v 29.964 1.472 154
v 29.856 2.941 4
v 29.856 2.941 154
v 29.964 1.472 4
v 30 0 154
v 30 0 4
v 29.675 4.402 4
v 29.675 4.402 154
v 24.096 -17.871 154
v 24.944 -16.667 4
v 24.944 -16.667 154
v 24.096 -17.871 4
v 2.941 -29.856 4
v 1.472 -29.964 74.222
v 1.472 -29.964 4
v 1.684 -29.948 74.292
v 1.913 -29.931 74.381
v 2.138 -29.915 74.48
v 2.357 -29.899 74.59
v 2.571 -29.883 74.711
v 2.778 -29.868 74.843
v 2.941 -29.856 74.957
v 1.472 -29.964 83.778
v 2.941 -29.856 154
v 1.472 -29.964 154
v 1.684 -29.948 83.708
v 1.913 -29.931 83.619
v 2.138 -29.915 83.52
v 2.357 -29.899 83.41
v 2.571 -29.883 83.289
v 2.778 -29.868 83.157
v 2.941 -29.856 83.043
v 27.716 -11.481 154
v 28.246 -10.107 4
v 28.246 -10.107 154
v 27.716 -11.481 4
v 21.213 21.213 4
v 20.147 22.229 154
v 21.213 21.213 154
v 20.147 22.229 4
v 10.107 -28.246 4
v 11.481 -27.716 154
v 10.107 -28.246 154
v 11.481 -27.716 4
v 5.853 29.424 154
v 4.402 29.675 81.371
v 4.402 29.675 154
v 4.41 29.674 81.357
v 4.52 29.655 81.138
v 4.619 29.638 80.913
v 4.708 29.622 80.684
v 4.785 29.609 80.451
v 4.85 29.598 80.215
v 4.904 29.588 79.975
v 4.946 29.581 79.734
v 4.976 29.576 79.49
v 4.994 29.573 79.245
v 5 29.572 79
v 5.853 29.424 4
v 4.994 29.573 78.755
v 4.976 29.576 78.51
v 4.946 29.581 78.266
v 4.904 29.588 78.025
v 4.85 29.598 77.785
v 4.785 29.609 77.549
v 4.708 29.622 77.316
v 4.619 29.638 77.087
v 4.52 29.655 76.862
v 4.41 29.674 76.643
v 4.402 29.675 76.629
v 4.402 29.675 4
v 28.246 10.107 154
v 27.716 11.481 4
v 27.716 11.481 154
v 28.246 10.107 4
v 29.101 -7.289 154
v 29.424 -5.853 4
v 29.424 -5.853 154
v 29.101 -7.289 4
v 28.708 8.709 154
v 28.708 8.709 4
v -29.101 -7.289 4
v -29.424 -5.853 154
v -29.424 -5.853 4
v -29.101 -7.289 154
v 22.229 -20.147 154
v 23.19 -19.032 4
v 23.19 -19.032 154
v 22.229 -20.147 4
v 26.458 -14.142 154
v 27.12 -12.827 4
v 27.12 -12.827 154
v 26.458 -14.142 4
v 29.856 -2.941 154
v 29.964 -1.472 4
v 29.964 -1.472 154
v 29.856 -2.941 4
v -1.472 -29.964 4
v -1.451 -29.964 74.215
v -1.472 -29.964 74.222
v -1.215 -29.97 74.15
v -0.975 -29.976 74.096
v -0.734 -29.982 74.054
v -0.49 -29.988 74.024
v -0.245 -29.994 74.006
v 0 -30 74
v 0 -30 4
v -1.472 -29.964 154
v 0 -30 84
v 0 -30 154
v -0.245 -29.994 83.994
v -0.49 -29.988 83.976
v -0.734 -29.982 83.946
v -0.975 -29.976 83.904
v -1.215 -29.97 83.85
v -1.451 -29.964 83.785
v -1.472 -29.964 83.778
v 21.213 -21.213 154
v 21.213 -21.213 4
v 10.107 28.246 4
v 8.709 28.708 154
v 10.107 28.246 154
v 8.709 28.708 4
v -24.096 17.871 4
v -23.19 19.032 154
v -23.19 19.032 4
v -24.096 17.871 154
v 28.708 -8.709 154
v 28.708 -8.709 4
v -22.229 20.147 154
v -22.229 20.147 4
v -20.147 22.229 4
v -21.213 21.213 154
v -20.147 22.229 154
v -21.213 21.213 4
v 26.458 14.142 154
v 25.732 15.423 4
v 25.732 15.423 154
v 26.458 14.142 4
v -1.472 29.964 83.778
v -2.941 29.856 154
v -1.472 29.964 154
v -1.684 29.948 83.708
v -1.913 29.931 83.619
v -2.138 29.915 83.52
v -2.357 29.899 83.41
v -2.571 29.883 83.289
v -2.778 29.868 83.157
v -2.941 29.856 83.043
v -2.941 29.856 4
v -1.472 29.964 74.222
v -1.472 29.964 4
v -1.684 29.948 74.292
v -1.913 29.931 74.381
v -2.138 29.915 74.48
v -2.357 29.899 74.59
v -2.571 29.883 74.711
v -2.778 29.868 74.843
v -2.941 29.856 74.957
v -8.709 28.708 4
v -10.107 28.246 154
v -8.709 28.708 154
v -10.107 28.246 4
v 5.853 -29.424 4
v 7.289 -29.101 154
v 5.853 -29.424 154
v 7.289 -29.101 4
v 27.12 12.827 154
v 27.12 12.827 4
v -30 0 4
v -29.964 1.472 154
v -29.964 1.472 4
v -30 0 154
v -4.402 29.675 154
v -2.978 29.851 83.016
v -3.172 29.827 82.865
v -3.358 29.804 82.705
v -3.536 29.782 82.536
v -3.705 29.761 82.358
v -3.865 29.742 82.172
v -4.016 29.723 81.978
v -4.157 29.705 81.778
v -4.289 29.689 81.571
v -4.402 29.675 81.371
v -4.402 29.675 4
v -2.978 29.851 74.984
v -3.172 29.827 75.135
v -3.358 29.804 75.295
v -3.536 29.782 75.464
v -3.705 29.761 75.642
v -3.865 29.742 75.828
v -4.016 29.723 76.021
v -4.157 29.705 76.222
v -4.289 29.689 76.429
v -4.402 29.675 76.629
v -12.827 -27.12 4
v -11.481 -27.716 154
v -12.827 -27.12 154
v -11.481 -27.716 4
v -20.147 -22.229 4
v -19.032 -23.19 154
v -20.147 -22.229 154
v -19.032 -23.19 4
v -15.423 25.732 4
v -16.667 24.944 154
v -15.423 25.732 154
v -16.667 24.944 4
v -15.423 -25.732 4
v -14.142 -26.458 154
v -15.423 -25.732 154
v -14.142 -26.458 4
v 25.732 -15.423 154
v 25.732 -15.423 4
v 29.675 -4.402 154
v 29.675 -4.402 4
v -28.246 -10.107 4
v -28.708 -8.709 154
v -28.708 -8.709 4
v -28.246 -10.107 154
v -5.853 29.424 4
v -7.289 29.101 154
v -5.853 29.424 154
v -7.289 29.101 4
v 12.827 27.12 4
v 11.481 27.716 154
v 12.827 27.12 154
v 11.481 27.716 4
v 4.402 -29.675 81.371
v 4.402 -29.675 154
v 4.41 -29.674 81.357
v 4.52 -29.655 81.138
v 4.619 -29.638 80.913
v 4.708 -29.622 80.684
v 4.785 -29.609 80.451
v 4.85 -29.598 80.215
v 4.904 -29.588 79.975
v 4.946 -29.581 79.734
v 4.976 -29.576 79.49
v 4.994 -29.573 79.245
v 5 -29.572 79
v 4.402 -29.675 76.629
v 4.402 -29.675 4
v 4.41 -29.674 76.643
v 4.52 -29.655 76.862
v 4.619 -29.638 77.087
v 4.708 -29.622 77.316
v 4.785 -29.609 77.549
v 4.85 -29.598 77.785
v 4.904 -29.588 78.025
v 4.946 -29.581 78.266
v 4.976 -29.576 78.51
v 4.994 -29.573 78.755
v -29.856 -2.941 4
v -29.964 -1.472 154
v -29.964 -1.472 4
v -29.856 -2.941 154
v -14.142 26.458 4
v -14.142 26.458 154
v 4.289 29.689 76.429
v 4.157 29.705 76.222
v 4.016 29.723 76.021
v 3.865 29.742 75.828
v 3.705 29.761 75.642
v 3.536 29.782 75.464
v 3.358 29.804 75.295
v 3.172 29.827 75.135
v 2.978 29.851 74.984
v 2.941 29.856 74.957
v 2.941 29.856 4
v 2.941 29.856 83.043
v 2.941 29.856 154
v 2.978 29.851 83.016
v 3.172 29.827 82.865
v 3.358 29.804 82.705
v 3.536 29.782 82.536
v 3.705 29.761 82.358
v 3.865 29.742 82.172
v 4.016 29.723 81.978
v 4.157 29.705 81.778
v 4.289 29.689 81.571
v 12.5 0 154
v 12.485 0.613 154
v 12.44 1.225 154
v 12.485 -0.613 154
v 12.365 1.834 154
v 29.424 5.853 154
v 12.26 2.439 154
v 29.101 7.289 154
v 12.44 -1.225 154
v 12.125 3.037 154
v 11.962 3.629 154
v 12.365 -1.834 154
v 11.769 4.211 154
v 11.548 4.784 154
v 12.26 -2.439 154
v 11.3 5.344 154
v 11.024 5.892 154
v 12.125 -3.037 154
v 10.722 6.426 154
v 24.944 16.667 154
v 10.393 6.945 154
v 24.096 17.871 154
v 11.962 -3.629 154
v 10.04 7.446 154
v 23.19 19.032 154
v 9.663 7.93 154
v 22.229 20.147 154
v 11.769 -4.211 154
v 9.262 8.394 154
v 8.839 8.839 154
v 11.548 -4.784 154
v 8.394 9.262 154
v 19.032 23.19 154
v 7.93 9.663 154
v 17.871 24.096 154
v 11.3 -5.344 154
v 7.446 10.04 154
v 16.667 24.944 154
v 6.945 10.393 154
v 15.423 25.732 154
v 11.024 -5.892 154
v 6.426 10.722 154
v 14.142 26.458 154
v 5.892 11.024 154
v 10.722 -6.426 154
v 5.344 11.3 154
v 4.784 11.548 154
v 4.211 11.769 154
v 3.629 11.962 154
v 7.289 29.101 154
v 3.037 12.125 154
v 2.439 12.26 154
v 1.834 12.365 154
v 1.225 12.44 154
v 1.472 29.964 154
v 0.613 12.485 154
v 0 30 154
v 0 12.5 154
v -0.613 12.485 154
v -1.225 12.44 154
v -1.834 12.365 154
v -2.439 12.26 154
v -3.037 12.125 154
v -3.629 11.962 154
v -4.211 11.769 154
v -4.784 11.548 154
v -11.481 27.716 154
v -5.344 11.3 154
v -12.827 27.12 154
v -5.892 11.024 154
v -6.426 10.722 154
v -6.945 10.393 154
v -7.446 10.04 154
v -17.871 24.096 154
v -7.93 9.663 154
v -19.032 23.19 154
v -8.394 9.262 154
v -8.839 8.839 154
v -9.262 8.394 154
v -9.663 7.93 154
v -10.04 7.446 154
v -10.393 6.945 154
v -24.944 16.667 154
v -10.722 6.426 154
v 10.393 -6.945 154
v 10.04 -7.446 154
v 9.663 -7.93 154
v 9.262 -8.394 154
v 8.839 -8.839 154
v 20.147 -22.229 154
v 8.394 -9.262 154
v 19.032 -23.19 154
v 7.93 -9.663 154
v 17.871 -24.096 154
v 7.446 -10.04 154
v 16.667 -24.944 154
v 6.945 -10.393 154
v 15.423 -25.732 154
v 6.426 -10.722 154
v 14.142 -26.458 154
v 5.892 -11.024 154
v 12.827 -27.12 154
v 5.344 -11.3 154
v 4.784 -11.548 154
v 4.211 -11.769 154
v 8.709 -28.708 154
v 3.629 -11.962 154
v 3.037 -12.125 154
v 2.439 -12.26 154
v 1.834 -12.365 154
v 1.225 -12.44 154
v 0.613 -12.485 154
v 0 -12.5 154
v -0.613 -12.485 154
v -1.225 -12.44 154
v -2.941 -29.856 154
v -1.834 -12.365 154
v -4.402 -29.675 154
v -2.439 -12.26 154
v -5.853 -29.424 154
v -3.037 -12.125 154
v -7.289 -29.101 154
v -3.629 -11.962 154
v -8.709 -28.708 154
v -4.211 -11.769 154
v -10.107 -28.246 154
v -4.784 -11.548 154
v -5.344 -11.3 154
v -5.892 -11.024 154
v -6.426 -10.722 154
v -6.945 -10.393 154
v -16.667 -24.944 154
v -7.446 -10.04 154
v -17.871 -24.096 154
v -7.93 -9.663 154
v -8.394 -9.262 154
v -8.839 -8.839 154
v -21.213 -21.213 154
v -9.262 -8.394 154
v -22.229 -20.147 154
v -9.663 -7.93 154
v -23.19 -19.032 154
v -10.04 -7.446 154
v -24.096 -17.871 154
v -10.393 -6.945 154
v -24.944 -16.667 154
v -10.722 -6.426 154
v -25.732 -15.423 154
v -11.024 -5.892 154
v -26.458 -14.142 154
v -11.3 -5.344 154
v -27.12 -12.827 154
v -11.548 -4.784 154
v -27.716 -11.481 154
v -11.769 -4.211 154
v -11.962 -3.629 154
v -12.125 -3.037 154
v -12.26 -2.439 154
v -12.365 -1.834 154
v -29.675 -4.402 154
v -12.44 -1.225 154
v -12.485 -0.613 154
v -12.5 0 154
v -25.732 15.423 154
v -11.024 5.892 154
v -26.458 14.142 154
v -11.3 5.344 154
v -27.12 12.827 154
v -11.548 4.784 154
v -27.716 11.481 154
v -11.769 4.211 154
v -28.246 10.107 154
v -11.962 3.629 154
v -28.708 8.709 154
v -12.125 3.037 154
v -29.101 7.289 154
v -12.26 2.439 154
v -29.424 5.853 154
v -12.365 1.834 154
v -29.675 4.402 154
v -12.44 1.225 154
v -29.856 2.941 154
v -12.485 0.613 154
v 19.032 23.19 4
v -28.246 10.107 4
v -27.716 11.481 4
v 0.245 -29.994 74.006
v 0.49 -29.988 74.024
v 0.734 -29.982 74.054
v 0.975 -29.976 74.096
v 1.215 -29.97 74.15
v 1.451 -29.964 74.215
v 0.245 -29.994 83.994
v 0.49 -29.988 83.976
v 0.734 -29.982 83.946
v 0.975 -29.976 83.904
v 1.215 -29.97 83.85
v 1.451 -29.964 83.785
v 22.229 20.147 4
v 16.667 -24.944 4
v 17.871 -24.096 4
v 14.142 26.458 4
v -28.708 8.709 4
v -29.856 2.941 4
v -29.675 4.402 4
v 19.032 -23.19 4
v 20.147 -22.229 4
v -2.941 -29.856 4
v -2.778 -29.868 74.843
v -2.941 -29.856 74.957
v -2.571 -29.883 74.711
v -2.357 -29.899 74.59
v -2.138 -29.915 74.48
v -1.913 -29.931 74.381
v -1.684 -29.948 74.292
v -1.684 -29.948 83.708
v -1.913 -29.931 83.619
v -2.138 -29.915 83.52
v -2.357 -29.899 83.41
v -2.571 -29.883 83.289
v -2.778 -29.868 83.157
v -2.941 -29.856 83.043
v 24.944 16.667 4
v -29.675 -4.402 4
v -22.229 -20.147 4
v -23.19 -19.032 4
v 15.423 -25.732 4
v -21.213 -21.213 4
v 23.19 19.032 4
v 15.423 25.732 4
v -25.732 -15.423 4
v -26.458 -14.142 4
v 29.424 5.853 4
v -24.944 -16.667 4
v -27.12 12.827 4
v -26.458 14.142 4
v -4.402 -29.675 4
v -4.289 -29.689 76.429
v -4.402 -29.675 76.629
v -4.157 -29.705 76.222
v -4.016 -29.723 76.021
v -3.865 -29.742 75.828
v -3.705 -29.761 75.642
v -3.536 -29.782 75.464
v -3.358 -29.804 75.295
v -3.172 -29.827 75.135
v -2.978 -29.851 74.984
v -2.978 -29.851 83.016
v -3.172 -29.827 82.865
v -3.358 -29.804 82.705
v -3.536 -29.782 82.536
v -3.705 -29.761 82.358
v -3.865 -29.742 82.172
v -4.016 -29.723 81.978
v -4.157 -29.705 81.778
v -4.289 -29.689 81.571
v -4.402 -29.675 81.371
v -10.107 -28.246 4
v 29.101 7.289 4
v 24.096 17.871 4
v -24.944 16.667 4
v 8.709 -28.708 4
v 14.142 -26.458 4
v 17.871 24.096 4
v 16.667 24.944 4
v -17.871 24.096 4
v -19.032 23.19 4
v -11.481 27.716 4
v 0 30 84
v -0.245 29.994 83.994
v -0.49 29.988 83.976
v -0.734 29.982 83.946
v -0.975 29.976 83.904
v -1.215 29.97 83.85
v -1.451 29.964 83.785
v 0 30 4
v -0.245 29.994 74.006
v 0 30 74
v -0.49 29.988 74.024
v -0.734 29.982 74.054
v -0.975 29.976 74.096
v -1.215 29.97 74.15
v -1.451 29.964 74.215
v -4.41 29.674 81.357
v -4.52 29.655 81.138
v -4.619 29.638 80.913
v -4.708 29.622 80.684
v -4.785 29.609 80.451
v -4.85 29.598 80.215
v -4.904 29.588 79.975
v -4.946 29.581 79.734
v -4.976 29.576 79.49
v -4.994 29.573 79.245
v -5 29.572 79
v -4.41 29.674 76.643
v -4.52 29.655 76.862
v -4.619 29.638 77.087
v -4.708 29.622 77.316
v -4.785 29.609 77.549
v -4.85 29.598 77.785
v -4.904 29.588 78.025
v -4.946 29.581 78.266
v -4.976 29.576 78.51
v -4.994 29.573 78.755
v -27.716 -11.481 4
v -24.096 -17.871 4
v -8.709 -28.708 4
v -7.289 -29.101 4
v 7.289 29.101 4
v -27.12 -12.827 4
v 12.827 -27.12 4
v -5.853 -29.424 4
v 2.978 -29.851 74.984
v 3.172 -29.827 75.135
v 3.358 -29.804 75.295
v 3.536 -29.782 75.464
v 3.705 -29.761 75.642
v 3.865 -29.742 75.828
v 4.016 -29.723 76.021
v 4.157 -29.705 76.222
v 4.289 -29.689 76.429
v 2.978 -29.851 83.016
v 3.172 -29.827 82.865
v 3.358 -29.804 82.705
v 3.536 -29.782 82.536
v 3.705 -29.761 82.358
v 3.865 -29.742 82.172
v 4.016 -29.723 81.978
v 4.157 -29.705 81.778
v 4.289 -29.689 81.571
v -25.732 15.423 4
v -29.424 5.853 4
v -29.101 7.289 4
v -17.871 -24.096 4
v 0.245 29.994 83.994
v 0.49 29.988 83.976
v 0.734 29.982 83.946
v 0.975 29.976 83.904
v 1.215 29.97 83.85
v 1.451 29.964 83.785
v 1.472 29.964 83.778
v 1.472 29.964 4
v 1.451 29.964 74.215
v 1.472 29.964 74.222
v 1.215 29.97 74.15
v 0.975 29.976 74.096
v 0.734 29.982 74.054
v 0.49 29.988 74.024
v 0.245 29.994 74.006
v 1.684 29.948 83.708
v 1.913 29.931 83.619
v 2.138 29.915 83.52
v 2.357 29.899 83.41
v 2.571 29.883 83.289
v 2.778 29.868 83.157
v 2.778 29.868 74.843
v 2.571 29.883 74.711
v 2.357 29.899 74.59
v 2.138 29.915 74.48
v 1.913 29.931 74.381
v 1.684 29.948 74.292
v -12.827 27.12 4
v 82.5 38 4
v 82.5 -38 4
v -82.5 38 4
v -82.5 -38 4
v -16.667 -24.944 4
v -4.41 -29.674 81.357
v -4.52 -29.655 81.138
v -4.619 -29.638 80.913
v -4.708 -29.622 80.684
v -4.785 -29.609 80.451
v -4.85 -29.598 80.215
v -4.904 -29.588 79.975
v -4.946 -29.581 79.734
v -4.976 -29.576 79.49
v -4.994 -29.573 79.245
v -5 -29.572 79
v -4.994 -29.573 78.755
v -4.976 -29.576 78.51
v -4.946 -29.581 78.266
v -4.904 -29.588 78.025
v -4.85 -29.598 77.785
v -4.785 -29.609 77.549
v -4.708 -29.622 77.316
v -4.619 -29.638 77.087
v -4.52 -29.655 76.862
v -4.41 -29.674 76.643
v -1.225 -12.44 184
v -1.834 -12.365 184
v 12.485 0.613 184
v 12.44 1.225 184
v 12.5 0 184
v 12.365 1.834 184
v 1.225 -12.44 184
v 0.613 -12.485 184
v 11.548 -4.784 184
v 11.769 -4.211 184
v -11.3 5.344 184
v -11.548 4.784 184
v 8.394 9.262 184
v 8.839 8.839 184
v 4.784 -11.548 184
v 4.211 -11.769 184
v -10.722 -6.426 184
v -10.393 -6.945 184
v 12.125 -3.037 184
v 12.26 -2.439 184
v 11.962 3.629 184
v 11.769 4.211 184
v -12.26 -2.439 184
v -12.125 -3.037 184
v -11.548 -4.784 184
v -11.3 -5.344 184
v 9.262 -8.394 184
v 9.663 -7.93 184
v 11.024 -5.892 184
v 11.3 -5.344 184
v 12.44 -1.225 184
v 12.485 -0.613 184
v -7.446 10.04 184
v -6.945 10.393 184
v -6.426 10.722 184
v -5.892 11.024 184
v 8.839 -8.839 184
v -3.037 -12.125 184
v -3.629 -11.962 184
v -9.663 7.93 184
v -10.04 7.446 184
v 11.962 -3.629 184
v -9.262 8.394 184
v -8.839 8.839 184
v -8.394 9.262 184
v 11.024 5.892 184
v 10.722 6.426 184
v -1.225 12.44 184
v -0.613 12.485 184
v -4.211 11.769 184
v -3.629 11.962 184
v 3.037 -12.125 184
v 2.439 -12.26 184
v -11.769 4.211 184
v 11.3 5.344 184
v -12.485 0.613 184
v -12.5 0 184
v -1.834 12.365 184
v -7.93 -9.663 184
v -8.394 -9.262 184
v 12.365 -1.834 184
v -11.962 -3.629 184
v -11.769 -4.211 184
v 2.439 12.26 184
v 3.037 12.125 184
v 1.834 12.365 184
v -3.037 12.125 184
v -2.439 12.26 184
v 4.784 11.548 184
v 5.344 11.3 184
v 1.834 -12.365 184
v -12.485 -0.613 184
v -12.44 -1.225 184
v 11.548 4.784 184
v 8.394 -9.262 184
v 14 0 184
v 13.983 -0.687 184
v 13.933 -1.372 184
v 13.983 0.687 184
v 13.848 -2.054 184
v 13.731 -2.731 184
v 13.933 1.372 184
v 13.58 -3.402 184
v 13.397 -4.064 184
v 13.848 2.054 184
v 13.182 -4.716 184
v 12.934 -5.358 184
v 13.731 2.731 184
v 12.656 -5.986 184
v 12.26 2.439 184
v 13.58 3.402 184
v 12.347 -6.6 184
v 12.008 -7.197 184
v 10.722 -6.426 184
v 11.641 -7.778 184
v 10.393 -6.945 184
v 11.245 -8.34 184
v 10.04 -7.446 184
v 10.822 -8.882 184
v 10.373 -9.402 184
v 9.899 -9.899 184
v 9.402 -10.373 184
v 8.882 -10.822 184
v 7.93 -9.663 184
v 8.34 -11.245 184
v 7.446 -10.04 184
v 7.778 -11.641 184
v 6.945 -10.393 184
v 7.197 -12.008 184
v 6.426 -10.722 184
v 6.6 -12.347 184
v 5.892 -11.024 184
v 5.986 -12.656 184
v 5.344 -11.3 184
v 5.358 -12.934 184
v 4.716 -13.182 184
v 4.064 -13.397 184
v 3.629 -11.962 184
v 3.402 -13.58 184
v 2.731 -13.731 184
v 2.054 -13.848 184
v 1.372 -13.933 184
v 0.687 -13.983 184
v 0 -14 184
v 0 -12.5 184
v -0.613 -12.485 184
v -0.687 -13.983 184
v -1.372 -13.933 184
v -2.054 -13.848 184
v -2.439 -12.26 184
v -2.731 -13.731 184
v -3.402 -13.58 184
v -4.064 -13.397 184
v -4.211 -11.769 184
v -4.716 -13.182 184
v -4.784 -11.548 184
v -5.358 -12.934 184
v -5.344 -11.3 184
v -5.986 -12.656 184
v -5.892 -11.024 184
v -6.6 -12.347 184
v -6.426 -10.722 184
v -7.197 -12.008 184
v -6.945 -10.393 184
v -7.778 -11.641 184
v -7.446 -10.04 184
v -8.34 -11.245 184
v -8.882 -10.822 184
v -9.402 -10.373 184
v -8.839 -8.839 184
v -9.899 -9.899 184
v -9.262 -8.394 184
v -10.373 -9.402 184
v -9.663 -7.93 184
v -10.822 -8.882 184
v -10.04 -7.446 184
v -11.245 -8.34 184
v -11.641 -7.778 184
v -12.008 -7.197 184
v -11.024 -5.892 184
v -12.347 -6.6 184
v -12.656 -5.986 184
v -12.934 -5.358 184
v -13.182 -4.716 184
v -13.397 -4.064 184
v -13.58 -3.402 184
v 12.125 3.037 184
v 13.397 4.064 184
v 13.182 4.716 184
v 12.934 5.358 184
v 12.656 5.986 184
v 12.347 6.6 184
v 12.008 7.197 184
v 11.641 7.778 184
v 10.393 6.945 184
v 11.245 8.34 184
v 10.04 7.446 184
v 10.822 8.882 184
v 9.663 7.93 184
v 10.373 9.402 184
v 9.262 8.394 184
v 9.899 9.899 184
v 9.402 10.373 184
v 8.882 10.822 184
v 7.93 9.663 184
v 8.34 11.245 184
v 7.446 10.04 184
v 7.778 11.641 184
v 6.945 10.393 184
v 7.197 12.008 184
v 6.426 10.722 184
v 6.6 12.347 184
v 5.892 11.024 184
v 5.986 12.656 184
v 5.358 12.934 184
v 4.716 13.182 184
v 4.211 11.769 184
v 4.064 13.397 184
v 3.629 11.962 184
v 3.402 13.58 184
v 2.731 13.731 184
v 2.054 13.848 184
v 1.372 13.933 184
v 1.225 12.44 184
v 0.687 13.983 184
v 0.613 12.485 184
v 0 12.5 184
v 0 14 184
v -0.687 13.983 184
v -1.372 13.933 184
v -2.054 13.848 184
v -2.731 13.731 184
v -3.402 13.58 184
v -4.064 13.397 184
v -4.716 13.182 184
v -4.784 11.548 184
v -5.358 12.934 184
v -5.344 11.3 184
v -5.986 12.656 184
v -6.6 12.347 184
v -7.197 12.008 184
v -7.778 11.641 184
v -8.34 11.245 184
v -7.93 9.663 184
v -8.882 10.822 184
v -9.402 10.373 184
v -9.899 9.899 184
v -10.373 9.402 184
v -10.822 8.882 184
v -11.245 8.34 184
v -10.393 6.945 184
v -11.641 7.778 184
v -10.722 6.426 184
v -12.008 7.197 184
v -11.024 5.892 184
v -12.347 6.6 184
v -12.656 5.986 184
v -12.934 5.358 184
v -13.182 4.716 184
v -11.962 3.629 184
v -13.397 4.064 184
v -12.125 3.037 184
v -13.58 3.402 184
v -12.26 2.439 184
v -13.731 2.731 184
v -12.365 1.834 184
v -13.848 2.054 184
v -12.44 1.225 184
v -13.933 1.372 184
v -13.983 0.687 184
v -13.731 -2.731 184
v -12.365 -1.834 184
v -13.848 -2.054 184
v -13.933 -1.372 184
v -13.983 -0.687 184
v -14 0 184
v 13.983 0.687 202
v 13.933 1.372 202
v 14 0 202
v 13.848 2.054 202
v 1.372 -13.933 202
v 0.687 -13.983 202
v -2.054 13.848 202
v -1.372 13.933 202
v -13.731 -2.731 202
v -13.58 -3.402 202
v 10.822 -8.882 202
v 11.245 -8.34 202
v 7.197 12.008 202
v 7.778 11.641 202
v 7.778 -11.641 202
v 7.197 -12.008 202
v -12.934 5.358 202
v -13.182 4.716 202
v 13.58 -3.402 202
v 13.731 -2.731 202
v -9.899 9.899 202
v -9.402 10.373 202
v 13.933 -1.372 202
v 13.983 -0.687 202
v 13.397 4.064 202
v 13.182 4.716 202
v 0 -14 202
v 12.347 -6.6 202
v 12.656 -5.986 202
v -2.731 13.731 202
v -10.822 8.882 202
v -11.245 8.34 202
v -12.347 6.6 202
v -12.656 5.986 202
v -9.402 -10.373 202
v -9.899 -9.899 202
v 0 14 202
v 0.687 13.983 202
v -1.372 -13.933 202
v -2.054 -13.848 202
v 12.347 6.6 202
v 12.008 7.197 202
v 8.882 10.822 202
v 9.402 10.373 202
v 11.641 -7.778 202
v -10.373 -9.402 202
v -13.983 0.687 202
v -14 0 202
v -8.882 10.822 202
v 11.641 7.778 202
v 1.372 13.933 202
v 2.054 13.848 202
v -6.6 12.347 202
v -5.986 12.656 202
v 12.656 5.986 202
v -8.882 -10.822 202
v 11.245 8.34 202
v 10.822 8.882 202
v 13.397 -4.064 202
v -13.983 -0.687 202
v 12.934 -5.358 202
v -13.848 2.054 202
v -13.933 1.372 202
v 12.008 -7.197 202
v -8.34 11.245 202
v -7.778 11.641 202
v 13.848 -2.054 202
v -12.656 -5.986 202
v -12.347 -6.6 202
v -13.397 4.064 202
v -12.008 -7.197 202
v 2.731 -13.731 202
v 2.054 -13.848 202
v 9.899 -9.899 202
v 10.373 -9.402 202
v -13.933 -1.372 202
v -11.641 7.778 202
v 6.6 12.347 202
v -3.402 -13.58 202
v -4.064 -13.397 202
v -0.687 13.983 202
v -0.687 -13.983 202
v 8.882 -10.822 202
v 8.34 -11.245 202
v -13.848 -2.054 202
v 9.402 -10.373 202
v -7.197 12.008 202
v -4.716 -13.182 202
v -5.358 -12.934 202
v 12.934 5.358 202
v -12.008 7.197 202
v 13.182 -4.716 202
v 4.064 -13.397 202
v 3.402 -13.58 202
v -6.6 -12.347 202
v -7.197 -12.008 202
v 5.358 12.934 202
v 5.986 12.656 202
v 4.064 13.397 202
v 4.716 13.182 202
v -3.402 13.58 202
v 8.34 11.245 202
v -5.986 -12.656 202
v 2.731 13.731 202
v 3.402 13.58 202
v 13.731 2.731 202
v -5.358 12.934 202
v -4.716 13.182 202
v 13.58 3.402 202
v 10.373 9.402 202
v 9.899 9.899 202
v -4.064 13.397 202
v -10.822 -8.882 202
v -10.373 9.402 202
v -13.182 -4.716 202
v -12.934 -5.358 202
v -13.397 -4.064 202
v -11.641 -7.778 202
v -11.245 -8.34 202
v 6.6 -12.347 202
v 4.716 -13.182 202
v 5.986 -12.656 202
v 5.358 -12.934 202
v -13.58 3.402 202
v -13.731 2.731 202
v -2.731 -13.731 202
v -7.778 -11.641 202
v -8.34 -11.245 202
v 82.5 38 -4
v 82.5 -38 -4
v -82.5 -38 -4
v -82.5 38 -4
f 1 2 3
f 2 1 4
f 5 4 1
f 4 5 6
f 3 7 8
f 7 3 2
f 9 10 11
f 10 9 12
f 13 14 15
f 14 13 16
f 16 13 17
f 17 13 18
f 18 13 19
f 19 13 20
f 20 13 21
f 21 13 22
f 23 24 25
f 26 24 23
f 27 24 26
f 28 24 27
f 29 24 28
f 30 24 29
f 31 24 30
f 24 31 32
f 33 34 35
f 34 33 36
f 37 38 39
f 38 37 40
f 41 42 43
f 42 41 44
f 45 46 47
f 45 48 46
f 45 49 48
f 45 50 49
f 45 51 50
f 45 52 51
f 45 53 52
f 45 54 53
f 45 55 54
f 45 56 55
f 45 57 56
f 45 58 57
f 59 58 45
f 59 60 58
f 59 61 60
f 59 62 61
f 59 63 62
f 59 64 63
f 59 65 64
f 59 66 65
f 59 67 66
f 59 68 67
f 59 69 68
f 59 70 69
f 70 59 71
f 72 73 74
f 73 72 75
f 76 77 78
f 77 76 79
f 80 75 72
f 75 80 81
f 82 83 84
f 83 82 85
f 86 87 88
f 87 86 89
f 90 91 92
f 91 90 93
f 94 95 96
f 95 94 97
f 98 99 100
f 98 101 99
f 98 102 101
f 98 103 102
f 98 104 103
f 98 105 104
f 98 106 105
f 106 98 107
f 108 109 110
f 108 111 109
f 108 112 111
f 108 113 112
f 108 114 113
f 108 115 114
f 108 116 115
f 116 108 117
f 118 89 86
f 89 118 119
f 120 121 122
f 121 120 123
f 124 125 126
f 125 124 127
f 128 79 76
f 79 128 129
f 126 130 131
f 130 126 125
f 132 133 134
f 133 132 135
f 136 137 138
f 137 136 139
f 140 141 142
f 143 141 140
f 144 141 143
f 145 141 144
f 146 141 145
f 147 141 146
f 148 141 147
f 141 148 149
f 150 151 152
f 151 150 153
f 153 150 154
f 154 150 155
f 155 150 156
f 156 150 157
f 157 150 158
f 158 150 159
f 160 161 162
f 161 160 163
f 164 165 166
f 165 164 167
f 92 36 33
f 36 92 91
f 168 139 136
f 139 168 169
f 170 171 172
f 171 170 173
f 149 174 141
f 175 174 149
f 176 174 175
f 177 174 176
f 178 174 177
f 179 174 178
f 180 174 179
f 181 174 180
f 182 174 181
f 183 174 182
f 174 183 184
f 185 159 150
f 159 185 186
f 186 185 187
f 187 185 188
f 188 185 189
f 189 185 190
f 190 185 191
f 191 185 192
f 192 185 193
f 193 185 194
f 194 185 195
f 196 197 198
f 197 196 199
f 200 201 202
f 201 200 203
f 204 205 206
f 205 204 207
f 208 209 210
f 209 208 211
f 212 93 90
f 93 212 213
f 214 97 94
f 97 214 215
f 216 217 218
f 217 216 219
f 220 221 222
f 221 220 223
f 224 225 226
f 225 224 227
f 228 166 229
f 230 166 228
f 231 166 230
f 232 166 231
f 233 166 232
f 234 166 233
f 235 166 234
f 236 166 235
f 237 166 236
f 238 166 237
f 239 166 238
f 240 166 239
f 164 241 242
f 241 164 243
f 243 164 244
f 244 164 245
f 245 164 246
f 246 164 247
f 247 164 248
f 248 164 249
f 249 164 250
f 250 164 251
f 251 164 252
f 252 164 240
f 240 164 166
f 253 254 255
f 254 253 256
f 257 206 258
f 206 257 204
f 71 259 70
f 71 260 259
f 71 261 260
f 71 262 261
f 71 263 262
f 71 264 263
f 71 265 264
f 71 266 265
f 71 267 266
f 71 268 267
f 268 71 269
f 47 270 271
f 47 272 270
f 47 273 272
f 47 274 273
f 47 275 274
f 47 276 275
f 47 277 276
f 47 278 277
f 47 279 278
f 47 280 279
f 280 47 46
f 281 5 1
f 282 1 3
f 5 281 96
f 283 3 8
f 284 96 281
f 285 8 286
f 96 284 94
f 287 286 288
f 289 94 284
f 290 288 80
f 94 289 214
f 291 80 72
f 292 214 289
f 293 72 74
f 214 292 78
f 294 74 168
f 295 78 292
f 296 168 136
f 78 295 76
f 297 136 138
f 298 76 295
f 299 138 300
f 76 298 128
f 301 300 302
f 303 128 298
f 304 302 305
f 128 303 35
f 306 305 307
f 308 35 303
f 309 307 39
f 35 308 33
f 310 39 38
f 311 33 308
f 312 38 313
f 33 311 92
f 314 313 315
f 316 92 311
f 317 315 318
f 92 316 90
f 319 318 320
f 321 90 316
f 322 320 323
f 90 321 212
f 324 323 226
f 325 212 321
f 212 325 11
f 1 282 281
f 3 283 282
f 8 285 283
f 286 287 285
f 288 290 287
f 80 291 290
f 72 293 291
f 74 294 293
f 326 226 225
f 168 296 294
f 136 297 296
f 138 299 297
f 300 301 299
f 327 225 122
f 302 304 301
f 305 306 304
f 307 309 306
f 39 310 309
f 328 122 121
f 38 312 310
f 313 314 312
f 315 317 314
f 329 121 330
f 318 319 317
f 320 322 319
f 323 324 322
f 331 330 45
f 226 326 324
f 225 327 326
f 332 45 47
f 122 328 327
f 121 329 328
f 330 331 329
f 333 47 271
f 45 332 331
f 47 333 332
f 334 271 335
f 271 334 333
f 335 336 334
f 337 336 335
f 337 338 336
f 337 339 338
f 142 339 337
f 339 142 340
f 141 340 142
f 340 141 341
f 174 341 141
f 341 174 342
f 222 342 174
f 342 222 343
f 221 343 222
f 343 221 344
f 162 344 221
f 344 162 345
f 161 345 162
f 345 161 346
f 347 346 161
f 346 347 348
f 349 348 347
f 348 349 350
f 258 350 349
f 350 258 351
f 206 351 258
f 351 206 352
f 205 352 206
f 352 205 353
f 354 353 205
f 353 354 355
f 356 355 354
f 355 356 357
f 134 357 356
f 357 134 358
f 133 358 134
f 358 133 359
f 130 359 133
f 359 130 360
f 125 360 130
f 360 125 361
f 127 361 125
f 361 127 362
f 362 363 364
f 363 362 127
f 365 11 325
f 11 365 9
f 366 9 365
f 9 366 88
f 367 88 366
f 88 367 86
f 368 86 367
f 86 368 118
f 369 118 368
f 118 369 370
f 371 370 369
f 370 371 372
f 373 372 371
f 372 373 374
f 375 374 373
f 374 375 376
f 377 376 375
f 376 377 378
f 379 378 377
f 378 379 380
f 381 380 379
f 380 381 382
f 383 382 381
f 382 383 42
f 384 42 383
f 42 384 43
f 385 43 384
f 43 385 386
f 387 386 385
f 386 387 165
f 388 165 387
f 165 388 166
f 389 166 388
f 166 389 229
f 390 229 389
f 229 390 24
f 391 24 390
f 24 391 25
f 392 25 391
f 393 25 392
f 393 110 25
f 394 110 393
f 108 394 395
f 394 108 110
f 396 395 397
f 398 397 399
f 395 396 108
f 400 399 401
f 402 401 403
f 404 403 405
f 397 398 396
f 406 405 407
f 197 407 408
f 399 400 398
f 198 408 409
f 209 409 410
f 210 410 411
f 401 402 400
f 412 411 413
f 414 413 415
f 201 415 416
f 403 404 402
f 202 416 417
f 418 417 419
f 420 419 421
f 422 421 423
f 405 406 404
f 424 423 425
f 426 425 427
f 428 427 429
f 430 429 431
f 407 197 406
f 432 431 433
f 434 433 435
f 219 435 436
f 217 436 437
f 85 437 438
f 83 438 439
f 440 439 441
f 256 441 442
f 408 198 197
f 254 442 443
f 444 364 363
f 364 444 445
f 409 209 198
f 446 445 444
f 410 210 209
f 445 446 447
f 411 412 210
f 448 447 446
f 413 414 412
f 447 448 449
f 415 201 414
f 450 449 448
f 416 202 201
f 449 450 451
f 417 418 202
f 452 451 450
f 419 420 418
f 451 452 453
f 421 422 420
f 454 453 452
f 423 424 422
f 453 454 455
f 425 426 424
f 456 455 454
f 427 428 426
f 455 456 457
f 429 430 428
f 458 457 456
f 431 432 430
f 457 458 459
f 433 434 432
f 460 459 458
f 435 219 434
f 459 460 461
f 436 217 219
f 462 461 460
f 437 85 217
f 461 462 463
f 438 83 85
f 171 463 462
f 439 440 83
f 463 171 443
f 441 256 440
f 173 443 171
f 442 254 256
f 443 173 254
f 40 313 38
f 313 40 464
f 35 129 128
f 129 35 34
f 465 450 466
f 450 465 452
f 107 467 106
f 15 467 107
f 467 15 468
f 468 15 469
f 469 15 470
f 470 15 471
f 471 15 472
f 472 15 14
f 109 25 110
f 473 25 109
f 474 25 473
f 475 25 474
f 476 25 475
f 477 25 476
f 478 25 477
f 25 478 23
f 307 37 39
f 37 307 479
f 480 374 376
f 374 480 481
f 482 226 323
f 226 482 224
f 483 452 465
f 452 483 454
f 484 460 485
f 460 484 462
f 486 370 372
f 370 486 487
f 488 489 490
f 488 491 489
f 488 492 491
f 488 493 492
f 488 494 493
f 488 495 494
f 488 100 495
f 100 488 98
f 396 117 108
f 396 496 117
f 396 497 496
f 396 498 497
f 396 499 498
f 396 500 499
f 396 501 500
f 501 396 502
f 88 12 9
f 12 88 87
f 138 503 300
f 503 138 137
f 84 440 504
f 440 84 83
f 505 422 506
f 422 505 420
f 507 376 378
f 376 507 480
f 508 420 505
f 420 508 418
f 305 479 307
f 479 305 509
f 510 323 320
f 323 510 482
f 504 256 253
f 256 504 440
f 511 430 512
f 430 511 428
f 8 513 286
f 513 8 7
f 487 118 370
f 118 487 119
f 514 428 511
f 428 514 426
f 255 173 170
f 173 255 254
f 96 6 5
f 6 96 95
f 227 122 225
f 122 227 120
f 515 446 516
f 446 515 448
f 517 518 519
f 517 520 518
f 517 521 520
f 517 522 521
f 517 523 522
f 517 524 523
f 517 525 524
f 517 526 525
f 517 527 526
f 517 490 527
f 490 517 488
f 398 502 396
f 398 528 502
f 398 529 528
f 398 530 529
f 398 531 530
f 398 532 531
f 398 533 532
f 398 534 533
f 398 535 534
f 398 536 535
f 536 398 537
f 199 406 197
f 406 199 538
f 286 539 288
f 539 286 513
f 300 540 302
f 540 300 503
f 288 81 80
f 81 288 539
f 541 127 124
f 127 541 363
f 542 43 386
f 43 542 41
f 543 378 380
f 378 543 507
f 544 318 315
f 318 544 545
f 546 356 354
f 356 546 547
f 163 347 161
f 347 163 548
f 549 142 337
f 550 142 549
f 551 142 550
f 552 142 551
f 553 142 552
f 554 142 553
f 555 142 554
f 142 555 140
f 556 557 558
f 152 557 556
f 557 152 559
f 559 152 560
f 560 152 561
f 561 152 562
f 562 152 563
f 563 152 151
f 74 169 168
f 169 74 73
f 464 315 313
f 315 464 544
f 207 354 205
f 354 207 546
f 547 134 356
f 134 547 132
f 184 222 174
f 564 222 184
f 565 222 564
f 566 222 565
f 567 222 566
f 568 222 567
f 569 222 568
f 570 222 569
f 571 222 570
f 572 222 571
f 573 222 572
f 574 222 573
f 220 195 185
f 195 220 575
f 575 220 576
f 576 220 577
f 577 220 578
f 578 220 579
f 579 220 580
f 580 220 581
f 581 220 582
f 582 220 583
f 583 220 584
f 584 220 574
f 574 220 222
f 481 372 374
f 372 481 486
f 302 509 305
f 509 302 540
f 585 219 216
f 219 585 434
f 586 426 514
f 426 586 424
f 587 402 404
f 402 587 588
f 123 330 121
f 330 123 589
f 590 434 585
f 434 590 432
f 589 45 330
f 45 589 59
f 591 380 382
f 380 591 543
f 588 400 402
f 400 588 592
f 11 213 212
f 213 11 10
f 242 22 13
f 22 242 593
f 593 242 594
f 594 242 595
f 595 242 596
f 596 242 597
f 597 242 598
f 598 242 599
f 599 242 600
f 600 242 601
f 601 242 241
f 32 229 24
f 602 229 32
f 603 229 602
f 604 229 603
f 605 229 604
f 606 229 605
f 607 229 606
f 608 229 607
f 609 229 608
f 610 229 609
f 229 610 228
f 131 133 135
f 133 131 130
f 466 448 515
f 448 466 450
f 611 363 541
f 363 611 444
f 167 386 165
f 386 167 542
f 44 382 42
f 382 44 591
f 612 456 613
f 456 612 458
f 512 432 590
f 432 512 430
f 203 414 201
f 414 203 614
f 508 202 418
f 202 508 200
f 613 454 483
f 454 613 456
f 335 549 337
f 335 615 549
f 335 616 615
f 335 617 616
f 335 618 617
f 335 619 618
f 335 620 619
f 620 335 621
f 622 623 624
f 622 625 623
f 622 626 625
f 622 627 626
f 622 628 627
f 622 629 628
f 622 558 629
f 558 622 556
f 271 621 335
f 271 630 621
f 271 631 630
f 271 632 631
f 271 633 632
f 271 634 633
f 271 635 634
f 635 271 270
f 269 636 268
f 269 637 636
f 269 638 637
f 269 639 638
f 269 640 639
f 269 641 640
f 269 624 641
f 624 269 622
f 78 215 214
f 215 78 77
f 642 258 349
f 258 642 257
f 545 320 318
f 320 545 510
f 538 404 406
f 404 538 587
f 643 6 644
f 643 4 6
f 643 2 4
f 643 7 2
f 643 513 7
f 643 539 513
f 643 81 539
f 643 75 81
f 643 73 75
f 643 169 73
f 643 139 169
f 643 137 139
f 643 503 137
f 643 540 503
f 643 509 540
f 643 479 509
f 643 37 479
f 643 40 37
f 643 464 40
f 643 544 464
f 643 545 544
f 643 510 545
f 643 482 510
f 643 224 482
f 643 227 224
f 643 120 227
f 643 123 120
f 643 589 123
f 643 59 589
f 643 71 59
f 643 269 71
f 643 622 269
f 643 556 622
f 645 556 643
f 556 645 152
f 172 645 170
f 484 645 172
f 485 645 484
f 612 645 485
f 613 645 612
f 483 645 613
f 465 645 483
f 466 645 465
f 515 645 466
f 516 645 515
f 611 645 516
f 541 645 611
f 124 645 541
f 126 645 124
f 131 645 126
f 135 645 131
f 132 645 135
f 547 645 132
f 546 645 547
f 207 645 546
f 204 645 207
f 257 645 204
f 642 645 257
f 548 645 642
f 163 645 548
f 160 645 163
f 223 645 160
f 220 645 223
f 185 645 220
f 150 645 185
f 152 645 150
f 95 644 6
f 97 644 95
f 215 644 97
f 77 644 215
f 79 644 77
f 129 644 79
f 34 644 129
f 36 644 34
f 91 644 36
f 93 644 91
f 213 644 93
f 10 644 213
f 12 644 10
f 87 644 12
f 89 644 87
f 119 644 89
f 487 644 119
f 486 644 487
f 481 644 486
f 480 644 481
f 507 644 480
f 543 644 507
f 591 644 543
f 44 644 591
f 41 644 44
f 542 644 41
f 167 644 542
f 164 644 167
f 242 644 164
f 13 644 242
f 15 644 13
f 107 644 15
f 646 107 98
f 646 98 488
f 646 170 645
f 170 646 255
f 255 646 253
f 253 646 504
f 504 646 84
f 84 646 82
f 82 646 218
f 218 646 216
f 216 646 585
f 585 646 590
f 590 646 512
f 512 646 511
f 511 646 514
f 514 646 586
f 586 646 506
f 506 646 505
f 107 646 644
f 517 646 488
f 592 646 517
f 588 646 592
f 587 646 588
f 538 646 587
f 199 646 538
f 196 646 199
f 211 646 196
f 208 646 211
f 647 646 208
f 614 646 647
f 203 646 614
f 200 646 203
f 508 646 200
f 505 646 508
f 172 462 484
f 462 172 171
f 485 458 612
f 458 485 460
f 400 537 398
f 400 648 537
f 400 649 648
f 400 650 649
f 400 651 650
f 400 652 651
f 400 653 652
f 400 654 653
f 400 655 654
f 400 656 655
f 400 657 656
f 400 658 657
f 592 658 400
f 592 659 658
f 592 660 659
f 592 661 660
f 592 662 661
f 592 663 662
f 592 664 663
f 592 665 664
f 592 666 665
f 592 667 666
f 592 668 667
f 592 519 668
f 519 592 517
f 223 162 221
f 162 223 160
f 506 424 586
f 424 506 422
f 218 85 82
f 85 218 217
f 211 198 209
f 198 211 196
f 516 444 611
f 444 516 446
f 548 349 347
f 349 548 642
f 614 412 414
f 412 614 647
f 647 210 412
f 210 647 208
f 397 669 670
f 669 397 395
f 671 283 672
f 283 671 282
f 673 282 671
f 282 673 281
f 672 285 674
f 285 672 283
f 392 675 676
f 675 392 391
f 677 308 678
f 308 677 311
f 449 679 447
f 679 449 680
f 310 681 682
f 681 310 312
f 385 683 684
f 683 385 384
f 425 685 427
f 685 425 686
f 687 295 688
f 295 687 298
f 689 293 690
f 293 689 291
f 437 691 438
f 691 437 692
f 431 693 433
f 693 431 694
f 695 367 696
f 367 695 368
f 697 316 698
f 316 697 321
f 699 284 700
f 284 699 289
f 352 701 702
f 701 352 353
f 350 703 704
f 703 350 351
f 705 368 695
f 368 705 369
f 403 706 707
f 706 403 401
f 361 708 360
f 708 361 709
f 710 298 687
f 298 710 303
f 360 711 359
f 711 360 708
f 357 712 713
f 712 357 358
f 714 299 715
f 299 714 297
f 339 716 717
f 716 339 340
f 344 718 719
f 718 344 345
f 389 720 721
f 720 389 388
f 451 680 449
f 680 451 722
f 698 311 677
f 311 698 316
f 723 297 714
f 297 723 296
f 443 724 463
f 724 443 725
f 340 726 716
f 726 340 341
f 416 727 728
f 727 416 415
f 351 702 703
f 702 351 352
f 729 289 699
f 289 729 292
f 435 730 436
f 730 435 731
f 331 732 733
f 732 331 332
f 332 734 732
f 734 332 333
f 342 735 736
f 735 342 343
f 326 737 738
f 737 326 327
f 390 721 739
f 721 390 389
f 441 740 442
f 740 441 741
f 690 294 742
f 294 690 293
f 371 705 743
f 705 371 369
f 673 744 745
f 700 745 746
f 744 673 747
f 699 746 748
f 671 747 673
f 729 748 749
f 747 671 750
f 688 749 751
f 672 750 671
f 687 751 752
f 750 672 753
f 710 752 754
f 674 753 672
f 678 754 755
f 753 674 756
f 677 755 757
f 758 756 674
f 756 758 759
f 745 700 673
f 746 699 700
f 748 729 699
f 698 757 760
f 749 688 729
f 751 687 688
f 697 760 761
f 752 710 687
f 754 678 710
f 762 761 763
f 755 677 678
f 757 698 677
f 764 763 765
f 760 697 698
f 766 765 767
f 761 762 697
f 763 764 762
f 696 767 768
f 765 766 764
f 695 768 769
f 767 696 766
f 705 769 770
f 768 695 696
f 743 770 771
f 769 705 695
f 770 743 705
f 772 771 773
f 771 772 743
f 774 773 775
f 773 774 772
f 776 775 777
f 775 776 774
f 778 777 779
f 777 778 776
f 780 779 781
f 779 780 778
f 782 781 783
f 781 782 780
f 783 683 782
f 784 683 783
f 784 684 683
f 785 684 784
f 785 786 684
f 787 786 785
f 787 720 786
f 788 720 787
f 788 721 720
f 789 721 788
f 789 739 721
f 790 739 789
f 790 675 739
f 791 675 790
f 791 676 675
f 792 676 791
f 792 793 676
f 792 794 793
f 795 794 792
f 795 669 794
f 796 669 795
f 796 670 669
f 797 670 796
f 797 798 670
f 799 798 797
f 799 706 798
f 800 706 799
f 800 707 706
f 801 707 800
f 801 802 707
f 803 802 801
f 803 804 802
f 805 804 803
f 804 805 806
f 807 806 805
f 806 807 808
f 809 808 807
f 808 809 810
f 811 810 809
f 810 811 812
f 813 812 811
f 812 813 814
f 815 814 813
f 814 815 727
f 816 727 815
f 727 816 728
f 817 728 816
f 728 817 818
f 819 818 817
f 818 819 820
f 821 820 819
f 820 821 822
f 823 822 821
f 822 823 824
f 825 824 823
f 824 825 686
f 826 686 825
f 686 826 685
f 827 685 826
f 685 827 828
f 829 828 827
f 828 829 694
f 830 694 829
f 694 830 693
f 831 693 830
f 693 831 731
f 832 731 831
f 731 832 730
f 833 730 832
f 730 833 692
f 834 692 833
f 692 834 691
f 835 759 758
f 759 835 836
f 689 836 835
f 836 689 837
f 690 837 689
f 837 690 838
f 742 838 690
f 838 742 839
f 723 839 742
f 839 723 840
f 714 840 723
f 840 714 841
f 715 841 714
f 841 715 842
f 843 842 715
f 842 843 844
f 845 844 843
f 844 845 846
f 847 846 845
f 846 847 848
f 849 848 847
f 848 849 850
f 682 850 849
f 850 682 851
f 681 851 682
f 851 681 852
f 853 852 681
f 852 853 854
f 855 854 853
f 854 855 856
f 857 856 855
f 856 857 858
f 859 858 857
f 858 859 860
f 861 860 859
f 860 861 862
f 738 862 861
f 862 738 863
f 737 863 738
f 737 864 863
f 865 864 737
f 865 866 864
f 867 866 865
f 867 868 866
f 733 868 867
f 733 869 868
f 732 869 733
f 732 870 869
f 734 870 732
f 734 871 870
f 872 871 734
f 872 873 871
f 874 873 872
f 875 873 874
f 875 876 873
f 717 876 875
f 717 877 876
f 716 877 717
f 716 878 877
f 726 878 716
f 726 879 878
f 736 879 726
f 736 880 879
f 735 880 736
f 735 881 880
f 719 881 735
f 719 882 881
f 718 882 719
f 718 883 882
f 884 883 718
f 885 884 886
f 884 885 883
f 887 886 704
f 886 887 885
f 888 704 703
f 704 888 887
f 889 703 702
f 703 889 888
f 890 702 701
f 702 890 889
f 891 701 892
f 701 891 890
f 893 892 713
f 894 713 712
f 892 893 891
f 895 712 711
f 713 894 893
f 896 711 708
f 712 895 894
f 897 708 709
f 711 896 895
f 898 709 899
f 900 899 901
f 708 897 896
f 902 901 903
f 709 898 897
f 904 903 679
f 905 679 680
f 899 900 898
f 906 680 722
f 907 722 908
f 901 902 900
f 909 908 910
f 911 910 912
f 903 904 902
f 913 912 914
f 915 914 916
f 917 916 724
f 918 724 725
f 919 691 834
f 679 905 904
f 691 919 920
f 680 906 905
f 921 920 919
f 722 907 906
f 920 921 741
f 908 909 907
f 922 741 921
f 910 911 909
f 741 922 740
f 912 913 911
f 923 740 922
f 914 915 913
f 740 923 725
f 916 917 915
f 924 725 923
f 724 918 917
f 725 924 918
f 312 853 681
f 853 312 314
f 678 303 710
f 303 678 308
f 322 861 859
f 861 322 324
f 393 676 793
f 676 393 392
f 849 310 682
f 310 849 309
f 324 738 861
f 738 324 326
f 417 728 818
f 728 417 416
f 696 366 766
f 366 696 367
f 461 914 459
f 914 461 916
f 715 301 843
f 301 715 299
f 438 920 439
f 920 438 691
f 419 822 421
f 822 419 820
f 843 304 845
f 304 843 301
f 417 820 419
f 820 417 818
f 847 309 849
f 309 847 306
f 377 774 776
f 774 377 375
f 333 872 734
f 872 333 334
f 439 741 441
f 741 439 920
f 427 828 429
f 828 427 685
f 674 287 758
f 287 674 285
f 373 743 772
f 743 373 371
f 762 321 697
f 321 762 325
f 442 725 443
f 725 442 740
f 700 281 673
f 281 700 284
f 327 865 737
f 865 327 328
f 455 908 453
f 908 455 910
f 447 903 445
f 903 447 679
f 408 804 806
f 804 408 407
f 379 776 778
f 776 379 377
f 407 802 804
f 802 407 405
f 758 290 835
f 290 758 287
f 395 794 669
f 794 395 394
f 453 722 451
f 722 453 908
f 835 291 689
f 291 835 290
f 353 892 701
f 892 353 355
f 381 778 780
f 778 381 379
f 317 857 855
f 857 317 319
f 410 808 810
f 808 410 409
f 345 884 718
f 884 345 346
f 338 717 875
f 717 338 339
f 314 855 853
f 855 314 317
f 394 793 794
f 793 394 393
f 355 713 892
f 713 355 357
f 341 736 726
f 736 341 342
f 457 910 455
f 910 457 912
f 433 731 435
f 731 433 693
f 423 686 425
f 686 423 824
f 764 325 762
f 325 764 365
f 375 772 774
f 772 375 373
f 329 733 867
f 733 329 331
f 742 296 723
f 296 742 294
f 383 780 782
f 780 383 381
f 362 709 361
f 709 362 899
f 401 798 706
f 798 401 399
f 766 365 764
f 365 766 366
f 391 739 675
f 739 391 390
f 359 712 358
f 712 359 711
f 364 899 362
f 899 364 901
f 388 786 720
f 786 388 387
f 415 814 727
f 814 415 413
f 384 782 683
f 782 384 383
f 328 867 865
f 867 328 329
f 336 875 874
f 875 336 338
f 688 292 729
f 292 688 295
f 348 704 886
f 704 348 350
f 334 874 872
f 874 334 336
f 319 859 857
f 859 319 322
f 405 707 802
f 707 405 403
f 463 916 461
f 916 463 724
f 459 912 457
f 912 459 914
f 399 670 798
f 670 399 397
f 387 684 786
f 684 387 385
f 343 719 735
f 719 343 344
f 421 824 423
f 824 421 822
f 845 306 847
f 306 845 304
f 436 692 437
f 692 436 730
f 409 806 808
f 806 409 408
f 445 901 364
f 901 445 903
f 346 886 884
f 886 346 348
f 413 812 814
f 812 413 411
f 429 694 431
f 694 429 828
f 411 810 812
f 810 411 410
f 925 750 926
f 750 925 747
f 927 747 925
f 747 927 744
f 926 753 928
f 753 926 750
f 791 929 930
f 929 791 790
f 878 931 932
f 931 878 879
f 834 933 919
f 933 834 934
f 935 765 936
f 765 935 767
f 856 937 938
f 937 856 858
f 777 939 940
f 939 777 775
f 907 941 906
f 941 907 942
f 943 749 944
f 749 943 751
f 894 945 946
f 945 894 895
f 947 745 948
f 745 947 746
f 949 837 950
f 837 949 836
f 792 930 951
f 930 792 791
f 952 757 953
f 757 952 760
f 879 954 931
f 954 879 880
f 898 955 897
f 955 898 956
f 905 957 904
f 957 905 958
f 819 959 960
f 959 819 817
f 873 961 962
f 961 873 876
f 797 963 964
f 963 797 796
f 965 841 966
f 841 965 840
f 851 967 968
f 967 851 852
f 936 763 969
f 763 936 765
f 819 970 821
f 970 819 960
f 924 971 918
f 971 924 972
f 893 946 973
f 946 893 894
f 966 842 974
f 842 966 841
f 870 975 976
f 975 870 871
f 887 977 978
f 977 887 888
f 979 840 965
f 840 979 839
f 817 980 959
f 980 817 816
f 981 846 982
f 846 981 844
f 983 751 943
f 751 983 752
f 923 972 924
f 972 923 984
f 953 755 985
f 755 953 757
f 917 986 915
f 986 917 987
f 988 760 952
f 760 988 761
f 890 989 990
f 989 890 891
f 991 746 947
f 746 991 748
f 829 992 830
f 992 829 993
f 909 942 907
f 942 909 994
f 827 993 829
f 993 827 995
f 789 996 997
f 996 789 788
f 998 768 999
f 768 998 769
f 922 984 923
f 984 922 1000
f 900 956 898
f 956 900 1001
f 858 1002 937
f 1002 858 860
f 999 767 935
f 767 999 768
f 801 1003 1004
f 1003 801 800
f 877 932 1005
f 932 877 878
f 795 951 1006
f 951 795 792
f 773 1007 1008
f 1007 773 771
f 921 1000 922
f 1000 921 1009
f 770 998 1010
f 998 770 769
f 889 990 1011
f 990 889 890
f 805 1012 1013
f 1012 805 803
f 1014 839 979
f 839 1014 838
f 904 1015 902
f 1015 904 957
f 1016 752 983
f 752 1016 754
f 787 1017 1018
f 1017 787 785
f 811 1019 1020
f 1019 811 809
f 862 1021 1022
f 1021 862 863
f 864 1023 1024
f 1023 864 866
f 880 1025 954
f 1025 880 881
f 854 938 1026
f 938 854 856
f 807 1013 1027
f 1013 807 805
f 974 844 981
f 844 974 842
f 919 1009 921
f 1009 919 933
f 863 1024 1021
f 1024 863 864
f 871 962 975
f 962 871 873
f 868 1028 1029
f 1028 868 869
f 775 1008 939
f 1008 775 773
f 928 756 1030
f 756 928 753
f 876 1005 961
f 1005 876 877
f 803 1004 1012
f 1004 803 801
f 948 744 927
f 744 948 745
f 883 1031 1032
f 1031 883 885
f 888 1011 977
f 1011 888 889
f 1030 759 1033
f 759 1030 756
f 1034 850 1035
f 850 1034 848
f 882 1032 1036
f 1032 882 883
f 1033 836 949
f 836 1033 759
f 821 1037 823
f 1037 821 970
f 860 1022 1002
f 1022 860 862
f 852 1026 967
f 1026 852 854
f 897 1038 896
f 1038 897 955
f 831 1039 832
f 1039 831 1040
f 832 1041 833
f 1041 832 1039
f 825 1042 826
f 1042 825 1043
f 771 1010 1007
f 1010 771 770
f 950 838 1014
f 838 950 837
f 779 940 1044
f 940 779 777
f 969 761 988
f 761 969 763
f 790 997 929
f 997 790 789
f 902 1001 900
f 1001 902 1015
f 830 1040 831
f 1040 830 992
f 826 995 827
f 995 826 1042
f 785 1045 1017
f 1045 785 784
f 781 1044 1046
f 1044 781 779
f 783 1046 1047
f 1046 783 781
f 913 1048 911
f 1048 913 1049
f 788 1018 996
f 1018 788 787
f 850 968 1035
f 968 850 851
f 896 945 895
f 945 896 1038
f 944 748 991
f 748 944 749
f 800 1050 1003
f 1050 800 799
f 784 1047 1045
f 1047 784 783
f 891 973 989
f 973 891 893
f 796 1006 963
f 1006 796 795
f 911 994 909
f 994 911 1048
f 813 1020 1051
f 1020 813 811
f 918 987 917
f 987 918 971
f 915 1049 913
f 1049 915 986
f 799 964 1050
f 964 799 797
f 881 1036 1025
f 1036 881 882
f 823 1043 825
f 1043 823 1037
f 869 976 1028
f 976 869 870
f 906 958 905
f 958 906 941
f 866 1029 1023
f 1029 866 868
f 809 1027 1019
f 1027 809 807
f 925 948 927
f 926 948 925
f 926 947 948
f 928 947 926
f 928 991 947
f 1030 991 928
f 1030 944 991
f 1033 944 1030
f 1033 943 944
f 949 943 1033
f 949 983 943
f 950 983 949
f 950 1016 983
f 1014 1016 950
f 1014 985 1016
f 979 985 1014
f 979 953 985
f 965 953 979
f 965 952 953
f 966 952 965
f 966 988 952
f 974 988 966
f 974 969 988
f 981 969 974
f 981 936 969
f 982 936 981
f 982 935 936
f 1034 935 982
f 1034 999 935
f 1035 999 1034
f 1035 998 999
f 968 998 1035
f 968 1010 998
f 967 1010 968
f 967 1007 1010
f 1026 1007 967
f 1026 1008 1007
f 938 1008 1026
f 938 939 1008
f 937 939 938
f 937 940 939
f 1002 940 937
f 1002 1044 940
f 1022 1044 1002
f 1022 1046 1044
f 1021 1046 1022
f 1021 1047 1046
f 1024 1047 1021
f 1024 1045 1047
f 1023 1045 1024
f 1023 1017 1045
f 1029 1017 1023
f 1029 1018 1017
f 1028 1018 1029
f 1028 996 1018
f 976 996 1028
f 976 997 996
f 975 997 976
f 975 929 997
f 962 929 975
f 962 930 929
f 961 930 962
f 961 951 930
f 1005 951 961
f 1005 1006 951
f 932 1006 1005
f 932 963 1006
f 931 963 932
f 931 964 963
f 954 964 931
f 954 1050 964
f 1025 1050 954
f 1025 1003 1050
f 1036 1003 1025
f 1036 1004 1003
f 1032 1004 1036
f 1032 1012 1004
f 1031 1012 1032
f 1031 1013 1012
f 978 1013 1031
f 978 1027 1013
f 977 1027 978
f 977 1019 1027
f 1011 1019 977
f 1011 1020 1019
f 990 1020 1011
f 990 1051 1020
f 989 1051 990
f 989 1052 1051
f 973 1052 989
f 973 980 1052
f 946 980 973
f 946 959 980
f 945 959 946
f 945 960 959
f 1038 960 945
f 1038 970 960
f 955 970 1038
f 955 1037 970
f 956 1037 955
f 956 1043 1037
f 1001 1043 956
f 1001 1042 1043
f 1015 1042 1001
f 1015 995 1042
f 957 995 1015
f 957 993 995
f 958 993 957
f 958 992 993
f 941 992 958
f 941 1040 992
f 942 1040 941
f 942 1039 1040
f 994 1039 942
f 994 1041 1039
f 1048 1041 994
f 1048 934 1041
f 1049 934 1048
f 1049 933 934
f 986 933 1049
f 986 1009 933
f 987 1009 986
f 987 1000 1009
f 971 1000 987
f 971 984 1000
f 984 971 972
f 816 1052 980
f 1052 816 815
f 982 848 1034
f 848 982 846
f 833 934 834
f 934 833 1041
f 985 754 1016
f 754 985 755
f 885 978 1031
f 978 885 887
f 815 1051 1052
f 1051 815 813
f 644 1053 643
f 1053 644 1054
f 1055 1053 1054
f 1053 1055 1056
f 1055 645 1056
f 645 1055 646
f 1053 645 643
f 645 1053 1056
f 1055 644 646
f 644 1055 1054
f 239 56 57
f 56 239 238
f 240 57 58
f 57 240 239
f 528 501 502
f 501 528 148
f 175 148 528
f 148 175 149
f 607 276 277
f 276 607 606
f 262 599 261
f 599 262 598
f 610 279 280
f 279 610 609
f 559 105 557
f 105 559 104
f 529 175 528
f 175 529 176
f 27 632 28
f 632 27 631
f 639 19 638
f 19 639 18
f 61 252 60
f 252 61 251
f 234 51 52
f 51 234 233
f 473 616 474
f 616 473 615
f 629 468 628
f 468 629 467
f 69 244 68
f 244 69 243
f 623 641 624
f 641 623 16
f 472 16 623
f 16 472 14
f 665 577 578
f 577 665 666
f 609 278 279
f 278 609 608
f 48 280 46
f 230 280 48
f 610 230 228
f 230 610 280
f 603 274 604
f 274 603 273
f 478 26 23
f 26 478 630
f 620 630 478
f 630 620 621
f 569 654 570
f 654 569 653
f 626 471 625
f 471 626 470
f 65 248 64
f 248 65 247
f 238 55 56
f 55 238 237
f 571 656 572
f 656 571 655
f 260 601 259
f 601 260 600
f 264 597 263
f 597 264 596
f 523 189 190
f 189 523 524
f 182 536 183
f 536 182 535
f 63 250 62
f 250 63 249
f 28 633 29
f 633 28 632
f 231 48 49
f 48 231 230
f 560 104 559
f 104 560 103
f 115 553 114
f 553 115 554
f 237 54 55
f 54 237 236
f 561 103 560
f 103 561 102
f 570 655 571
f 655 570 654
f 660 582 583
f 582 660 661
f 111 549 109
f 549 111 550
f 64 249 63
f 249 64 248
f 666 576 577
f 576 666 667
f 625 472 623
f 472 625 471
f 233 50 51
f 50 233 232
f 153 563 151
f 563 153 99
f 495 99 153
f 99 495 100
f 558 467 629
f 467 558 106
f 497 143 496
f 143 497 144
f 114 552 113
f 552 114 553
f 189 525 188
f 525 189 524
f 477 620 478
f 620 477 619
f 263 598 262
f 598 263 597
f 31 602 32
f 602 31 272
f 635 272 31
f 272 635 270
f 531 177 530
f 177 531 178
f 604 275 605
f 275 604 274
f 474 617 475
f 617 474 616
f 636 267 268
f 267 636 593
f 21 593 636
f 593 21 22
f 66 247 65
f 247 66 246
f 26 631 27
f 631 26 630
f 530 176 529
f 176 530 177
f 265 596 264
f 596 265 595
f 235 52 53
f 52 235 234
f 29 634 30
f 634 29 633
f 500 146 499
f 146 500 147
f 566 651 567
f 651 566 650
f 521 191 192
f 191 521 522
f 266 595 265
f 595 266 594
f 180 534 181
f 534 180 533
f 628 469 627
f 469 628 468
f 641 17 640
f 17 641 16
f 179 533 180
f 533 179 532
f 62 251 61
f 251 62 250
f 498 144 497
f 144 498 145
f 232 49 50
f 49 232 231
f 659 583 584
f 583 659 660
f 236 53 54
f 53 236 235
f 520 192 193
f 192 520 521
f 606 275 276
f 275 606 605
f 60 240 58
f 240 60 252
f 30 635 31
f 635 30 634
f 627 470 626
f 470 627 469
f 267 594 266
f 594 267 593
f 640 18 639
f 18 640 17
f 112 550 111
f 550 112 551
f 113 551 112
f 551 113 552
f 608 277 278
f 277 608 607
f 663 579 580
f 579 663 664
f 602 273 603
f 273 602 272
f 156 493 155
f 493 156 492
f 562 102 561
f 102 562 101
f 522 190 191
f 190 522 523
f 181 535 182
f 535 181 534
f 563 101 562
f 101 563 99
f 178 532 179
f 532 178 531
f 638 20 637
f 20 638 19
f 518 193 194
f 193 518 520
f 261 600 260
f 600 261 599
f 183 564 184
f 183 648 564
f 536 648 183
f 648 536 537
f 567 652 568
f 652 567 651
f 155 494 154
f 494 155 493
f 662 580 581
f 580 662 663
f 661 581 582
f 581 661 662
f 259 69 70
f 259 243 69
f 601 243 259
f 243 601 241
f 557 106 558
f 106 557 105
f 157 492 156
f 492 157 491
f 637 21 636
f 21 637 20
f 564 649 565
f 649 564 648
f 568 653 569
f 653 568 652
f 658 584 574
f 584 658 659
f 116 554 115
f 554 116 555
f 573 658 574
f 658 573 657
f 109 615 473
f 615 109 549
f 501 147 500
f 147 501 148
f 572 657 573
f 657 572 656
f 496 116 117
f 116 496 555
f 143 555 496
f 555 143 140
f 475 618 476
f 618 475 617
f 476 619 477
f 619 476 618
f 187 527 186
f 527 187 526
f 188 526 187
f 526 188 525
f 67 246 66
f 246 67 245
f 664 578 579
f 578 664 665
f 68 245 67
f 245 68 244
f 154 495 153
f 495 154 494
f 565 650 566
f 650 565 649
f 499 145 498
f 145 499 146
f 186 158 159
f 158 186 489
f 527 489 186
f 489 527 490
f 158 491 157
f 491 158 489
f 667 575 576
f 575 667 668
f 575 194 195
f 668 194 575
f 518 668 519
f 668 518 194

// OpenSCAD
$fn = 128;

// 165.8 x 76.7 x 8.8 mm
module movil() {
  cube([165,76,8], true);
}

// 150, 60
// 30, 25

module botella() {
    // Este cilindro es la base de la botella
    cylinder(150, 30, 30, true);
  
    // Trasladamos el cilindro en el eje Z
    // La mitad de lo que mide la botella (75)
    // más la mitad de lo que mide el cuello (15)
    translate([0, 0, 75 + 15]) {
        cylinder(30, 12.5, 12.5, true);
    }
    
    translate([0, 0, 75 + 30 + 9]) {
        cylinder(18, 14, 14, true);
    }
}

module forat() {
    translate([0,0,75 + 4]) {
        rotate([90,0,0]) {
            cylinder(600, 5, 5, true);
        }
    }
}

// body es la unión del movil y la botella
module body() {
    movil();
    translate([0,0,75 + 4]) {   
        botella();    
    }
}

// Restamos al body el forat, la zona de intersección desaparece
difference() {
    body();
    forat();
}
